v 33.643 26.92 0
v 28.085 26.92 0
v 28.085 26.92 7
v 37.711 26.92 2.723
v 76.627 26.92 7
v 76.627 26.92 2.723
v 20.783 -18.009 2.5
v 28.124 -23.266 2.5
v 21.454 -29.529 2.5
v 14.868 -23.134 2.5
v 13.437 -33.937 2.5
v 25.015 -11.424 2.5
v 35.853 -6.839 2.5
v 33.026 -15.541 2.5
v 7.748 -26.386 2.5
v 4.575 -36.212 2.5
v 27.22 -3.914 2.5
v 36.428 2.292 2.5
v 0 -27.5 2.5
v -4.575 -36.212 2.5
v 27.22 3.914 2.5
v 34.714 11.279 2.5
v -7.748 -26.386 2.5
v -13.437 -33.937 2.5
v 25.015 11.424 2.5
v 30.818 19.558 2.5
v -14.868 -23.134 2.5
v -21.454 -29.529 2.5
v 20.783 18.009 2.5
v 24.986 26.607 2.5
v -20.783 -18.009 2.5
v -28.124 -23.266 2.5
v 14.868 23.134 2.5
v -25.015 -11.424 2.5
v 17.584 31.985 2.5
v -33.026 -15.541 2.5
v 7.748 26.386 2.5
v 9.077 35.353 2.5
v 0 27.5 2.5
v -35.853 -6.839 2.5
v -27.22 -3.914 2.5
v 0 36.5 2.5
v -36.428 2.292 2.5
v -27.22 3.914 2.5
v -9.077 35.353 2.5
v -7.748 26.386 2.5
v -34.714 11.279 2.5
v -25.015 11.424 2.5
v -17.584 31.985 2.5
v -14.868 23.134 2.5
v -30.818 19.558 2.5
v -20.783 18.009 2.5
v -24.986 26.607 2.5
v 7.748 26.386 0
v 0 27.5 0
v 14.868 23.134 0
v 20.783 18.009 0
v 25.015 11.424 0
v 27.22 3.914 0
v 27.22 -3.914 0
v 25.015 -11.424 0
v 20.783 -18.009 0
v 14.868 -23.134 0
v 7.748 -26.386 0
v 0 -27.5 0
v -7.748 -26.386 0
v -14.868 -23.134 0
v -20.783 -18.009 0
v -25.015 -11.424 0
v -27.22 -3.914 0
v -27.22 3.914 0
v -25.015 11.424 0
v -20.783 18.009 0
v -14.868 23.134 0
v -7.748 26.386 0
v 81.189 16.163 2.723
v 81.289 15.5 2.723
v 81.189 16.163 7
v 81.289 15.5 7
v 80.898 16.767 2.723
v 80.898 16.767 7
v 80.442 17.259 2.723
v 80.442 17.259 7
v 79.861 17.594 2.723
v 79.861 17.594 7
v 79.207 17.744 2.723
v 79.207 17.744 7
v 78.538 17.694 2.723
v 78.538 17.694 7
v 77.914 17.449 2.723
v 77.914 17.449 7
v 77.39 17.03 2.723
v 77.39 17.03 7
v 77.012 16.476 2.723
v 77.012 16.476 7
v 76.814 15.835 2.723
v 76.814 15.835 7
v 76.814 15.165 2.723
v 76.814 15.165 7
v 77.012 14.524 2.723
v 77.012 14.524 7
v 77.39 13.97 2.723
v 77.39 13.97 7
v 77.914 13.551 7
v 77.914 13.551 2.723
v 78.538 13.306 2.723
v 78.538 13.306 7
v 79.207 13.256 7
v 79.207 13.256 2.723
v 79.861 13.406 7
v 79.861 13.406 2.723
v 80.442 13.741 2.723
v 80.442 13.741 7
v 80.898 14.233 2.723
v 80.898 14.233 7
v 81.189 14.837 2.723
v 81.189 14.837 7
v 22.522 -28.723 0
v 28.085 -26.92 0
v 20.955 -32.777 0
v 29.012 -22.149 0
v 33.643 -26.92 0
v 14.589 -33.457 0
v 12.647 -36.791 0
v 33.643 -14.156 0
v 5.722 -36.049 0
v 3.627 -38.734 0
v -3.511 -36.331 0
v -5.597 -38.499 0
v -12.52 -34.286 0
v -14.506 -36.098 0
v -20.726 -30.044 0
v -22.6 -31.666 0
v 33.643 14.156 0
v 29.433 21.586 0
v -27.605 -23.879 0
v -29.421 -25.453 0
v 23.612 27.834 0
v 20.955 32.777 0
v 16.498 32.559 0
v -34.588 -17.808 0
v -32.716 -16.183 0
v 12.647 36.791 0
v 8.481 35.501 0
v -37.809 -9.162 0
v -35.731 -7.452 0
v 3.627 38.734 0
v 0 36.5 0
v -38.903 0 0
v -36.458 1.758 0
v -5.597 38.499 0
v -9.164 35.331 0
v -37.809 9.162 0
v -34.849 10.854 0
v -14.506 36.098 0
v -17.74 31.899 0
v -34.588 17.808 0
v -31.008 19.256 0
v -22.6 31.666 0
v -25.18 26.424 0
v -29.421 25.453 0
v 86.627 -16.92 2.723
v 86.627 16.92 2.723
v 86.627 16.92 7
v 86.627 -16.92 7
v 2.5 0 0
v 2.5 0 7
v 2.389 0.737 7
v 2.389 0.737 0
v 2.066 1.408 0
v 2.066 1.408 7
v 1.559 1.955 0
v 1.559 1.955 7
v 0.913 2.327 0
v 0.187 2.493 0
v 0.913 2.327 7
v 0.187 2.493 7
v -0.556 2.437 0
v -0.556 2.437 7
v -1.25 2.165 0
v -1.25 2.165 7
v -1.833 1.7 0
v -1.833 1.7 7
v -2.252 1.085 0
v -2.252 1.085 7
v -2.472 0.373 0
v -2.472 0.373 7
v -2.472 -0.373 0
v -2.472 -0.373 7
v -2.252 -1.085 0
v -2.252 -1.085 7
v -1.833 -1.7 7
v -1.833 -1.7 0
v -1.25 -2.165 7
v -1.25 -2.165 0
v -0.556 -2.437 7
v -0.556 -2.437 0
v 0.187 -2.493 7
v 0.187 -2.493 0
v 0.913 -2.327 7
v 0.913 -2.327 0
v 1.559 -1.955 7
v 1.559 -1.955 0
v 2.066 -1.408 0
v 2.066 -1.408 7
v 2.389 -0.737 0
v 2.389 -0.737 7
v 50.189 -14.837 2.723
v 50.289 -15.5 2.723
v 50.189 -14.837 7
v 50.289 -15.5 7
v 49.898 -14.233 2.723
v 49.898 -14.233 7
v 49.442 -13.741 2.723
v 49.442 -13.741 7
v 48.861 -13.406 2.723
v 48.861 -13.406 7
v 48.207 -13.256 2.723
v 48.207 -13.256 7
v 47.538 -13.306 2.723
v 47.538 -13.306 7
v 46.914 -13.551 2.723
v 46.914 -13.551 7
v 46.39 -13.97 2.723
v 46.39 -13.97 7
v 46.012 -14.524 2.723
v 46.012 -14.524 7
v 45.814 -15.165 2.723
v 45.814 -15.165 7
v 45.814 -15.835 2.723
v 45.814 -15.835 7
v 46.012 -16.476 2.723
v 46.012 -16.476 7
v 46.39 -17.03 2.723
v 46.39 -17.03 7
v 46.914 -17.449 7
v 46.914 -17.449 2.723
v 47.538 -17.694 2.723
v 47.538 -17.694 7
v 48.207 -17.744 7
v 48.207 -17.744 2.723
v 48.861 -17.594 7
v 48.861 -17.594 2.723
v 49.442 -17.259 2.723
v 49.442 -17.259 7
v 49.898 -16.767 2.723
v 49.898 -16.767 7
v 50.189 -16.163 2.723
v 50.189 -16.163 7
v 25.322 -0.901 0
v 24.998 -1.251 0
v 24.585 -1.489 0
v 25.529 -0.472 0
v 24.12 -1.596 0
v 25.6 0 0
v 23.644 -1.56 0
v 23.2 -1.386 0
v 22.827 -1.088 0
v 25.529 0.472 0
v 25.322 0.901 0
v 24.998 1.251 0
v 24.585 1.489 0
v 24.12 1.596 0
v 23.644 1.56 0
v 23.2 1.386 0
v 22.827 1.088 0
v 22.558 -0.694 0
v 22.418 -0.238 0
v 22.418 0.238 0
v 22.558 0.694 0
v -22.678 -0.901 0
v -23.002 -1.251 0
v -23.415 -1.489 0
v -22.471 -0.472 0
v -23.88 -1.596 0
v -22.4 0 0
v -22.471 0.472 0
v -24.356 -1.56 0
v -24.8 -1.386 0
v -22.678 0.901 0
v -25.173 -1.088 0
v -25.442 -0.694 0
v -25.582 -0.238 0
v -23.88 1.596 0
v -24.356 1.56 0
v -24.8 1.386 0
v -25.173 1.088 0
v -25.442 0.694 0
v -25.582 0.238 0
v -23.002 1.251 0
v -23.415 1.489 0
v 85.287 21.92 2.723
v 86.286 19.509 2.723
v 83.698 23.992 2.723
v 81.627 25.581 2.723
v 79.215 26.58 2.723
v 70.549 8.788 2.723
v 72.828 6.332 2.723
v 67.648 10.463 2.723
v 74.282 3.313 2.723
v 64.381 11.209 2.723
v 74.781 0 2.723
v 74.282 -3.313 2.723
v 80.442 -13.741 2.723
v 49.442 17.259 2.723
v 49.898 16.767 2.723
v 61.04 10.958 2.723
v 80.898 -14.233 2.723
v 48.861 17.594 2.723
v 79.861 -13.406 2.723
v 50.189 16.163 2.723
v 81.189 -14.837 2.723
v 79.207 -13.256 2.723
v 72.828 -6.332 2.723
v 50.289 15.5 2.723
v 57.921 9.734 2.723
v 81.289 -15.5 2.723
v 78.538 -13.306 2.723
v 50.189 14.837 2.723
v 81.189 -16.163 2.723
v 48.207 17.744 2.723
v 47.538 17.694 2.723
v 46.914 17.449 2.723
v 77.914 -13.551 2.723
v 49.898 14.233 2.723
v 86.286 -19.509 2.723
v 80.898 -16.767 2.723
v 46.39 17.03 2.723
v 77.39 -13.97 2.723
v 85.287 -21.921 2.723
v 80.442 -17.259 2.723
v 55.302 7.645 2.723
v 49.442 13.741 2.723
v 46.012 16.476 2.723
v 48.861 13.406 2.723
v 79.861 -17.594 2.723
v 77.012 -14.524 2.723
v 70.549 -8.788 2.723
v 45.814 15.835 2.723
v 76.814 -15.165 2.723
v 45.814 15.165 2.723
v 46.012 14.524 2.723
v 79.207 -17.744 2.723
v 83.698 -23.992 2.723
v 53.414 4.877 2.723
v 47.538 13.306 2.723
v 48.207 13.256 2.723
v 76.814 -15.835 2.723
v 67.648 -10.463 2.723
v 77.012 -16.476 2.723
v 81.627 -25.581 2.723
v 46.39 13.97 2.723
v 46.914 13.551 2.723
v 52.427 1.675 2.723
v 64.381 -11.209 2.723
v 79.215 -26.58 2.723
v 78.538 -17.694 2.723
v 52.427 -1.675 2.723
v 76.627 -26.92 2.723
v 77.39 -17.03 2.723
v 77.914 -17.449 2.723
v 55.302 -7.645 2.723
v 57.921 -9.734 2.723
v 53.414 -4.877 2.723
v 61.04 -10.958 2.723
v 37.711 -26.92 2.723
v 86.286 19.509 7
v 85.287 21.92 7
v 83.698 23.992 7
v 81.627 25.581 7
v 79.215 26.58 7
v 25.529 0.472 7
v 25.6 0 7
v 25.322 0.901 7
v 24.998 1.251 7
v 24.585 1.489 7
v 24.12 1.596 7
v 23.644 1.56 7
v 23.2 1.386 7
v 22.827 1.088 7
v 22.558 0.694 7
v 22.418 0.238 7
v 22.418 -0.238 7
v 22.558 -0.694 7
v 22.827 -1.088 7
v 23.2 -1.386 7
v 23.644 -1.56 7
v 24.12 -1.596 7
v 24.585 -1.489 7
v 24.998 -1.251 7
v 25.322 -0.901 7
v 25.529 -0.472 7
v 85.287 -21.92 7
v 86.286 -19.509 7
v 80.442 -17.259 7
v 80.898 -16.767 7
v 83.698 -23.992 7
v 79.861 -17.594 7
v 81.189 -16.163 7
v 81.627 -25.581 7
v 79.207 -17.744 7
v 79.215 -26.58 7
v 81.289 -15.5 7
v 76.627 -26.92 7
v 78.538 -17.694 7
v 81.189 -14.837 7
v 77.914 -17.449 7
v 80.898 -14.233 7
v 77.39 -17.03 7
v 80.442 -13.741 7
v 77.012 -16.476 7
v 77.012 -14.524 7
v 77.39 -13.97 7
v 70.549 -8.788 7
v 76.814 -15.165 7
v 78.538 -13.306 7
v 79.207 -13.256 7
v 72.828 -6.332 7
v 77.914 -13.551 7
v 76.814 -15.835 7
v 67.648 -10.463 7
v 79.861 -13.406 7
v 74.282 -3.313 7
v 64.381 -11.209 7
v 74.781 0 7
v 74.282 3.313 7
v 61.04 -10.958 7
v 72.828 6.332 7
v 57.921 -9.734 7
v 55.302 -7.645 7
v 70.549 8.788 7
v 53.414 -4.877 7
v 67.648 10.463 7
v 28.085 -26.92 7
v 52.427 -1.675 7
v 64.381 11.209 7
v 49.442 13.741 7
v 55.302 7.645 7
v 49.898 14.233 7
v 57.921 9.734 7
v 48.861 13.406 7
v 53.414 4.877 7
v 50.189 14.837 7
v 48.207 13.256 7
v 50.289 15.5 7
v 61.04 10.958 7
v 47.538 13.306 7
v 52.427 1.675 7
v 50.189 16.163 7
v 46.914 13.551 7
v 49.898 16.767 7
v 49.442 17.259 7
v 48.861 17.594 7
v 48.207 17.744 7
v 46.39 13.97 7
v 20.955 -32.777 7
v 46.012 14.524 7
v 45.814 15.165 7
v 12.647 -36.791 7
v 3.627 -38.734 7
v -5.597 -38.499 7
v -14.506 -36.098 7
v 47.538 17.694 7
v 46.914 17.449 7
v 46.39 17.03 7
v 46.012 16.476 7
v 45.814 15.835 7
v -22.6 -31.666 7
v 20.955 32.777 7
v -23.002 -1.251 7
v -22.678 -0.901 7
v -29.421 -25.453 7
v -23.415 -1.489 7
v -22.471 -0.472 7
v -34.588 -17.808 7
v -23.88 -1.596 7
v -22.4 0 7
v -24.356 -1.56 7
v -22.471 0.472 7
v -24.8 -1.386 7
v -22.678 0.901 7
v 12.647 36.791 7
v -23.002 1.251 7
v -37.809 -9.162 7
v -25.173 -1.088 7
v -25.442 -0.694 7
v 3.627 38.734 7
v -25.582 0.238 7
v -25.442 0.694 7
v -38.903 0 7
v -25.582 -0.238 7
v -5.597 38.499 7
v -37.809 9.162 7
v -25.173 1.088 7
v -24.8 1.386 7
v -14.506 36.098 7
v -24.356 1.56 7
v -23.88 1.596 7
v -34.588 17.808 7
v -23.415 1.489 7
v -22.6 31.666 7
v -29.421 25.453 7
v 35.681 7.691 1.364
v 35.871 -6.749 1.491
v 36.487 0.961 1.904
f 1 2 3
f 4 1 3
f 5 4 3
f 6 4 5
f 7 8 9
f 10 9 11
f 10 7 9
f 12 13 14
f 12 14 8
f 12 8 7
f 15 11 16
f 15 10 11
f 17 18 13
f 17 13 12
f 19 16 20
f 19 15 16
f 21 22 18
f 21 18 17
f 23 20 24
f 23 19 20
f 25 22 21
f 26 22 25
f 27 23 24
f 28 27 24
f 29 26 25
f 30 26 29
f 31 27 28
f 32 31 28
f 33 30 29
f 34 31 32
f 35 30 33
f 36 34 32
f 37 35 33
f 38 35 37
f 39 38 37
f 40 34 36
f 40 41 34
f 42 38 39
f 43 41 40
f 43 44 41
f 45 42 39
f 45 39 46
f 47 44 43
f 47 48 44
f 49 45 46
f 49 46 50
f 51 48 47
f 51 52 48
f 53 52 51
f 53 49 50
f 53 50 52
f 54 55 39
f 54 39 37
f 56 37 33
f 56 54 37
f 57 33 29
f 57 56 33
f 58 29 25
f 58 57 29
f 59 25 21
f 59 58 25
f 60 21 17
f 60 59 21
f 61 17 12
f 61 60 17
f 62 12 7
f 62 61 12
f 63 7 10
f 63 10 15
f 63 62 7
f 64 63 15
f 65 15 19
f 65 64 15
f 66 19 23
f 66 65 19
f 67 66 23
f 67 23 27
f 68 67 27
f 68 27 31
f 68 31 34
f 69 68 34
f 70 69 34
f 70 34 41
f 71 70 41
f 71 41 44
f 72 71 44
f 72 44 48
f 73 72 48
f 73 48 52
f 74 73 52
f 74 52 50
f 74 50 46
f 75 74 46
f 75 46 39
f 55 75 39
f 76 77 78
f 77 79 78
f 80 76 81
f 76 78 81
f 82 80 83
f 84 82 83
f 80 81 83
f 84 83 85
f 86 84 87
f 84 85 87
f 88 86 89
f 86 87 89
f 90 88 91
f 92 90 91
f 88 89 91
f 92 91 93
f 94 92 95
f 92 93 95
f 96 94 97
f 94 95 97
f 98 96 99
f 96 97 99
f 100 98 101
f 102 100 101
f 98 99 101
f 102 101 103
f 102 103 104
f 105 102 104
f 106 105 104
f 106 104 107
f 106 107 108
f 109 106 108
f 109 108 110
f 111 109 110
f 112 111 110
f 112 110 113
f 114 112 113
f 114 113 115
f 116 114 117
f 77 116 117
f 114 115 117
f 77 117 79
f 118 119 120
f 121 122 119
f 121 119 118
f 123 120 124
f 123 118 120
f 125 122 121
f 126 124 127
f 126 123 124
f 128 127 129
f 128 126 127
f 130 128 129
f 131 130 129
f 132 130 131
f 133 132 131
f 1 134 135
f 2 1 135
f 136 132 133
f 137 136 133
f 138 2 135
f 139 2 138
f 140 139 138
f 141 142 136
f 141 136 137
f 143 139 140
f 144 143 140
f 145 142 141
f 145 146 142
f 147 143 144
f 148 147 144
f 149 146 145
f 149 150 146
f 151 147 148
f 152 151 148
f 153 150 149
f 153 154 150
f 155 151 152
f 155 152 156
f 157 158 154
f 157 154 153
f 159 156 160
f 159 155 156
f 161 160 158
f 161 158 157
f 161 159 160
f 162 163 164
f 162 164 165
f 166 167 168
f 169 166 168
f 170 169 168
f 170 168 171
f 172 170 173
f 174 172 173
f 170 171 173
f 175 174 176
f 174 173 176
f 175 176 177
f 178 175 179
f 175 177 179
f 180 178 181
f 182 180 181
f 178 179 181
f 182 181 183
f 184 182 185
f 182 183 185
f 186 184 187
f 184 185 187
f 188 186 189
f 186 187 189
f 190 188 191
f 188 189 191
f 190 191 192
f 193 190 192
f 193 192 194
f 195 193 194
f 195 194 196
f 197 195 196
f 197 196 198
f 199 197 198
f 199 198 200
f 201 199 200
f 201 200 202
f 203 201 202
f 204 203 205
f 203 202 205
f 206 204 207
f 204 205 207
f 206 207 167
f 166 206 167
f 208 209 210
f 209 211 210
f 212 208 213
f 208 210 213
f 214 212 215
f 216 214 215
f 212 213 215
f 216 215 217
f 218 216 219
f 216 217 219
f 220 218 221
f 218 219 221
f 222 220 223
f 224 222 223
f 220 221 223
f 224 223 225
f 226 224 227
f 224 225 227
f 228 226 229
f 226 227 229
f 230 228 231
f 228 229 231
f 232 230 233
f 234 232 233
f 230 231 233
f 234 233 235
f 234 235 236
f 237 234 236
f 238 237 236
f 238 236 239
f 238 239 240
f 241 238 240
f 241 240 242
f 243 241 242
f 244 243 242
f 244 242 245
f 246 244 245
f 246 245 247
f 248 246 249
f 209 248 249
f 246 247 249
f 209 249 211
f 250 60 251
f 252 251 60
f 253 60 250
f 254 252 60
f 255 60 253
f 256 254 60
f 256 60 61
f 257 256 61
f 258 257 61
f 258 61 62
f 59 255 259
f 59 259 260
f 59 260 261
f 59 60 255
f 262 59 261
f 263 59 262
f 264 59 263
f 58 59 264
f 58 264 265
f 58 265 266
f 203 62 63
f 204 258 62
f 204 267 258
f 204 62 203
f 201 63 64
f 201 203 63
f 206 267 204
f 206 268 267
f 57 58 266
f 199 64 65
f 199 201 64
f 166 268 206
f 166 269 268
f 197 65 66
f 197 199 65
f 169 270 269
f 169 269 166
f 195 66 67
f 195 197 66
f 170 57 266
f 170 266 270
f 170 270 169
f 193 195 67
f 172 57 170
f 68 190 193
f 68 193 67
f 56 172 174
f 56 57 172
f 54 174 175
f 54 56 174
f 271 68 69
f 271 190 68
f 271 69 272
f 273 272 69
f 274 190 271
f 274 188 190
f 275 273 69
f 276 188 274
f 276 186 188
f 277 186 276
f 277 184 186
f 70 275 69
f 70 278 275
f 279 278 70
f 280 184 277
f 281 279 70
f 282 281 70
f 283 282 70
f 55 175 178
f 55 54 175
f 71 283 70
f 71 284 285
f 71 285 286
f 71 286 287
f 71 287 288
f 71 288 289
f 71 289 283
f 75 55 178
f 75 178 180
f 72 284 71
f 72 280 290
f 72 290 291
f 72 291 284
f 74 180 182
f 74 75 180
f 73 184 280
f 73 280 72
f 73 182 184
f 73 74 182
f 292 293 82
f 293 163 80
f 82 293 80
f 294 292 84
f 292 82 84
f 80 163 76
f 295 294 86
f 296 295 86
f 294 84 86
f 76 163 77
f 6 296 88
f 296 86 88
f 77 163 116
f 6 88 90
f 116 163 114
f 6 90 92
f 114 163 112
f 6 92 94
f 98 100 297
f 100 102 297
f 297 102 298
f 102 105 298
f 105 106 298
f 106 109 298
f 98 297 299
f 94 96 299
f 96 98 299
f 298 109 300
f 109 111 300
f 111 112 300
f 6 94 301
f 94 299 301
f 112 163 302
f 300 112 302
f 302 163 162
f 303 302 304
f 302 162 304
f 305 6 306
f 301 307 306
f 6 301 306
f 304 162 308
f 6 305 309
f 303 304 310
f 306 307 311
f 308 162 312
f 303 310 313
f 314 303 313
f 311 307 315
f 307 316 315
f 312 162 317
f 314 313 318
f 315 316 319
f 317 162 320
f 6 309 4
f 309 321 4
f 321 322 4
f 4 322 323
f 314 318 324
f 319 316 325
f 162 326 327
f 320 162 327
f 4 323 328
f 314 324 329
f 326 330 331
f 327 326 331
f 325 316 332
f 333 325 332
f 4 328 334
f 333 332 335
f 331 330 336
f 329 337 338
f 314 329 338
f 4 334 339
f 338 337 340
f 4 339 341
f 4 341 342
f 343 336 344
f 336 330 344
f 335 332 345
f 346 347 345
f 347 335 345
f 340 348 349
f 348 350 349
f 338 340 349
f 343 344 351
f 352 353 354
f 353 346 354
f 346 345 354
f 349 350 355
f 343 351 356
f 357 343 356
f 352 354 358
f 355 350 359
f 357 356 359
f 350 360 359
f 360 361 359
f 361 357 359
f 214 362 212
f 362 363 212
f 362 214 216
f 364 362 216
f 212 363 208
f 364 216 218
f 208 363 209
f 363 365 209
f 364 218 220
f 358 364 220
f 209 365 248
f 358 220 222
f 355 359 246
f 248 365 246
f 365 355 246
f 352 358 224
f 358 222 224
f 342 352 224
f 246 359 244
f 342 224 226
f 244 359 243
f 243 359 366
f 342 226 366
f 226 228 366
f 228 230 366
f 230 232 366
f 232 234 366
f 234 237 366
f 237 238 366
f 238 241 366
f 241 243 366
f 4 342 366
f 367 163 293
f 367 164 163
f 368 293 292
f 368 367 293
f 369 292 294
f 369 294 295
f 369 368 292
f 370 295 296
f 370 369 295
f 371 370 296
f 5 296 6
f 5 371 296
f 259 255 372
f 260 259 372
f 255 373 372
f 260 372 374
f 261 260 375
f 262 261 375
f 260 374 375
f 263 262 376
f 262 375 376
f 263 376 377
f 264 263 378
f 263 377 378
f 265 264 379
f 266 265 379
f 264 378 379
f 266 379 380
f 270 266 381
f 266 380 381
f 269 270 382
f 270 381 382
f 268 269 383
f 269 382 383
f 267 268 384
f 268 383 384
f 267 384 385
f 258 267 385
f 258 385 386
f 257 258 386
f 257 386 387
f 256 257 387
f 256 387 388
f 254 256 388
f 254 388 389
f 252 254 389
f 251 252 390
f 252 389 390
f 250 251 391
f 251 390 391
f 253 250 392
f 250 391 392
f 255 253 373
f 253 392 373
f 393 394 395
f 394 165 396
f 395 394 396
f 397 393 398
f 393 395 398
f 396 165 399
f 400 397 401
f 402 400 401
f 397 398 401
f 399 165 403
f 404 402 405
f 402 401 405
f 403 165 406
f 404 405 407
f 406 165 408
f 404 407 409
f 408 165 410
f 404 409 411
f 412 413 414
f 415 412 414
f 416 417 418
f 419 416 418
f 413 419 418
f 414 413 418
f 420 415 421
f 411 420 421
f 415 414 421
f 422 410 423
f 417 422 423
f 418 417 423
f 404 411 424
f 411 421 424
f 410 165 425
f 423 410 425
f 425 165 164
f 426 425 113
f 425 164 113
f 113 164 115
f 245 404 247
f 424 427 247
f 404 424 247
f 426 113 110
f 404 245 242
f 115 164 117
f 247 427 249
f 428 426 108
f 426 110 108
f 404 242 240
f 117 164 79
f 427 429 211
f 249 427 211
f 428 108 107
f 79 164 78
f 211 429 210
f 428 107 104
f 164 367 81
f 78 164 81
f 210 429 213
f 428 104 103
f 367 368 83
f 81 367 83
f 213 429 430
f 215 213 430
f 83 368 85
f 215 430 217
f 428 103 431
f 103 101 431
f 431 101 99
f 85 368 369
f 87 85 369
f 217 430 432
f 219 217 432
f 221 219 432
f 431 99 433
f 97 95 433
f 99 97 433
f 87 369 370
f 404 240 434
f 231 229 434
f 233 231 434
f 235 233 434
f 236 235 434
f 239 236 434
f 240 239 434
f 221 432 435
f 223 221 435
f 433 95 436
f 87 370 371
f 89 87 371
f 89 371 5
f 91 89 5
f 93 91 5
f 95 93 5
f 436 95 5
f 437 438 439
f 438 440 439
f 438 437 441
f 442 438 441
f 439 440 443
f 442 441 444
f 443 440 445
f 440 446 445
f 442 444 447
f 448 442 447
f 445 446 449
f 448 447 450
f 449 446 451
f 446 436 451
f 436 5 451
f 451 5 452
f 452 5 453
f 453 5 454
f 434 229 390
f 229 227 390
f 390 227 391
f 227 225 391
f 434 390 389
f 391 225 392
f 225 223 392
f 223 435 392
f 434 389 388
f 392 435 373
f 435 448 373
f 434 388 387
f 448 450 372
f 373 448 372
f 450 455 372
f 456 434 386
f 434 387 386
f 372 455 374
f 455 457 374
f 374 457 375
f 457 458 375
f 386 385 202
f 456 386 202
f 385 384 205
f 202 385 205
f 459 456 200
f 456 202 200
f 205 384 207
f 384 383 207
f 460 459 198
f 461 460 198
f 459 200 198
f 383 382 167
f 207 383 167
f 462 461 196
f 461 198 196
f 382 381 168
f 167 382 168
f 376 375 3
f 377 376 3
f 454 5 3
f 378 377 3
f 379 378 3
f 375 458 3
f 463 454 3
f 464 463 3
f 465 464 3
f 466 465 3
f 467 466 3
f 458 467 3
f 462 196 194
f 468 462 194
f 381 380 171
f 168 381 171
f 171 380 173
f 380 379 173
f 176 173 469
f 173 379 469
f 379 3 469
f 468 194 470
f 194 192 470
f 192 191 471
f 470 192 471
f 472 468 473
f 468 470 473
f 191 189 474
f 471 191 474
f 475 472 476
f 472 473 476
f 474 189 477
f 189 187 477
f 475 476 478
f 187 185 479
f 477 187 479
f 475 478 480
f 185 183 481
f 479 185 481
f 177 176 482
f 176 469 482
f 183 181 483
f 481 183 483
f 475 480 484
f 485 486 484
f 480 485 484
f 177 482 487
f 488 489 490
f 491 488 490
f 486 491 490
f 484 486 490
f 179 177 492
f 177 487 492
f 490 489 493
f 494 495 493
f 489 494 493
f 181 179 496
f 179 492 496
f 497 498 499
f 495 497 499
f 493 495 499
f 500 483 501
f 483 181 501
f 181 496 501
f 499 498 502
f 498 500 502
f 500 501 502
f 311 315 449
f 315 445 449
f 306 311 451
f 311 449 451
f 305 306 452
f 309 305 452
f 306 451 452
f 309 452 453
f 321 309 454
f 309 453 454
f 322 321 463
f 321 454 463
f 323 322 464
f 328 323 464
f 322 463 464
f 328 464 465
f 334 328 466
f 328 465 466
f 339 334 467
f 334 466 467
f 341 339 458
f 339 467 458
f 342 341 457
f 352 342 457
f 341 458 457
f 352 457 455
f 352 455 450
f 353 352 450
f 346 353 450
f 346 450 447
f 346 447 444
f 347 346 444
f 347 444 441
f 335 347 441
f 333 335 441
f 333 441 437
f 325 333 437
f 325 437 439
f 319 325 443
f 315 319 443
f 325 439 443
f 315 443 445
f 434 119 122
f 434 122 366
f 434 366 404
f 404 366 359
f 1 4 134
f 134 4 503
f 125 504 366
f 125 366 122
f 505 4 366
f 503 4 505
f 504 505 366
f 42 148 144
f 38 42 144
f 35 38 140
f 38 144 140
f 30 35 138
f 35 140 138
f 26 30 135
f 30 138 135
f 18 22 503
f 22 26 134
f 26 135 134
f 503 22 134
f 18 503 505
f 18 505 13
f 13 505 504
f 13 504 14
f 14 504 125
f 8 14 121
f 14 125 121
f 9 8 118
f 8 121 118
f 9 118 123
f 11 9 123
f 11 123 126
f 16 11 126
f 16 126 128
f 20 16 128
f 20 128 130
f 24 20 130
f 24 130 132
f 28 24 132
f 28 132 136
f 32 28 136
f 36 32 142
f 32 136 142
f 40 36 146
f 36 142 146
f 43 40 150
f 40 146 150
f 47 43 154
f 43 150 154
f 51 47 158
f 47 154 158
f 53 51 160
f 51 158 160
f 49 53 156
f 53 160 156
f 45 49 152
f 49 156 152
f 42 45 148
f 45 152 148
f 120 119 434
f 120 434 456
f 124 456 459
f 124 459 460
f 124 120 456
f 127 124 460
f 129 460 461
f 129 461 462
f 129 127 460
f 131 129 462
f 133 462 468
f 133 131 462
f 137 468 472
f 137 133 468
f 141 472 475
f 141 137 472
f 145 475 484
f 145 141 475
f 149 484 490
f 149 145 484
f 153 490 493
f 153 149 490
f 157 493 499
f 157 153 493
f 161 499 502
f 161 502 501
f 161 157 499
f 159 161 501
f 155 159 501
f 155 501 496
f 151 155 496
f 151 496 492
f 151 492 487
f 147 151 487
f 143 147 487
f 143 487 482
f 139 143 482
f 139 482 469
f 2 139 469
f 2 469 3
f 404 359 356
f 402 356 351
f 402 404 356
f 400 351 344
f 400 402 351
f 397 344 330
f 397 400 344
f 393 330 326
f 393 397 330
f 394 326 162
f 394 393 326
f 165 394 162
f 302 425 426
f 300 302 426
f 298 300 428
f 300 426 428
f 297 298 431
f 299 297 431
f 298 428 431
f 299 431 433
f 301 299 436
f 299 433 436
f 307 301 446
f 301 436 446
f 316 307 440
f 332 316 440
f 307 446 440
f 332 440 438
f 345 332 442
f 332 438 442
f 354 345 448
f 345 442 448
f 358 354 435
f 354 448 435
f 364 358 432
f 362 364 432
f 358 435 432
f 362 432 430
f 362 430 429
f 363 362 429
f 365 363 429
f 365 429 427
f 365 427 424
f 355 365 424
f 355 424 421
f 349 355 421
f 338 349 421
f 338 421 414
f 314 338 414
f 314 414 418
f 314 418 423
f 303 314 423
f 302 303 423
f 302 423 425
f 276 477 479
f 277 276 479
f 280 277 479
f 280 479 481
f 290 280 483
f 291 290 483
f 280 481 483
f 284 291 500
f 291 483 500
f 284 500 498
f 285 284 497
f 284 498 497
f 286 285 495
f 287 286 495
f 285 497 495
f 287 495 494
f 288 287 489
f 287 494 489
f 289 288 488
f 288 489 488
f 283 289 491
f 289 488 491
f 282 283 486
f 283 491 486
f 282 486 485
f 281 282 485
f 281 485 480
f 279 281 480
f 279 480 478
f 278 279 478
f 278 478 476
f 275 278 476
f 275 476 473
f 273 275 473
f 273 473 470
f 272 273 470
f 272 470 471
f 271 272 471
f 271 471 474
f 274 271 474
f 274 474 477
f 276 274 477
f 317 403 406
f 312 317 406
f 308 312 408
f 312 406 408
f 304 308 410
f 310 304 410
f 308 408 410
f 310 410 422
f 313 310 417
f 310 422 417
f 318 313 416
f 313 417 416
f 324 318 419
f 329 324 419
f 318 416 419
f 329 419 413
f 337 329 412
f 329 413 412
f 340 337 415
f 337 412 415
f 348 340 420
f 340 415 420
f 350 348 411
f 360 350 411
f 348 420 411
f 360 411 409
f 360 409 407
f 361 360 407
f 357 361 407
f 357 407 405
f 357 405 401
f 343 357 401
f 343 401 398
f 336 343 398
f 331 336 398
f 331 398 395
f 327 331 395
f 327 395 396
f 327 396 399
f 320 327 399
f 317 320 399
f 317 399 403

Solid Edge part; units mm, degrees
sketch "Sketch1" plane through (0, 0, 0) normal (0, 0, 1) x (1, 0, 0)
  line L0 (86.627, 26.9205) -> (86.627, 0)
  line L1 (86.627, -26.9205) -> (86.627, 0)
  line L2 (28.085, -26.9205) -> (86.627, -26.9205)
  line L3 (28.085, 26.9205) -> (86.627, 26.9205)
  arc A0 (28.085, -26.9205) -> (28.085, 26.9205) centre (0, 0) cw
extrude "Protrusion1" add sketch "Sketch1" along normal blind 7
fillet "Redondeo_1" radius 10 2 edges at (86.627, 26.9205, 3.5) (86.627, -26.9205, 3.5)
sketch "Sketch2" plane through (23.8618, 0, 7) normal (0, 0, 1) x (1, 0, 0)
  circle A0 centre (-47.8618, 0) radius 1.6
  circle A1 centre (-23.8618, 0) radius 2.5
  circle A2 centre (0.1382, 0) radius 1.6
  circle A3 centre (24.1773, 15.5) radius 2.25
  circle A4 centre (24.1773, -15.5) radius 2.25
  circle A5 centre (39.6793, 0) radius 11.24
  circle A6 centre (55.1773, -15.5) radius 2.25
  circle A7 centre (55.1773, 15.5) radius 2.25
  dimension "D1" = 22.48
  dimension "D2" = 23.086
  dimension "D3" = 4.5
  dimension "D4" = 31
  dimension "D5" = 31
  dimension "D6" = 7.588
  dimension "D7" = 3.2
  dimension "D8" = 24
  dimension "D9" = 24
  dimension "D10" = 5
extrude "Cutout1" cut sketch "Sketch2" against normal up to next
sketch "Sketch3" plane through (52.356, -26.9205, 3.5) normal (0, -1, 0) x (1, 0, 0)
  line L0 (34.271, -0.777) -> (-14.645, -0.777)
  line L1 (-14.645, -0.777) -> (-18.713, -3.5)
  line L2 (-18.713, -3.5) -> (34.271, -3.5)
  line L3 (34.271, -3.5) -> (34.271, -0.777)
extrude "Cutout2" cut sketch "Sketch3" against normal up to next
sketch "Sketch4" plane through (-2.6302, 0, 0) normal (0, 0, -1) x (0, 1, 0)
  arc A0 (14.1561, 36.2733) -> (-14.1561, 36.2733) centre (0, 2.6302) cw construction
  circle A1 centre (0, 2.6302) radius 36.5
  circle A2 centre (0, 2.6302) radius 27.5
extrude "VaciadoExtruido_3" cut sketch "Sketch4" against normal blind 2.5
